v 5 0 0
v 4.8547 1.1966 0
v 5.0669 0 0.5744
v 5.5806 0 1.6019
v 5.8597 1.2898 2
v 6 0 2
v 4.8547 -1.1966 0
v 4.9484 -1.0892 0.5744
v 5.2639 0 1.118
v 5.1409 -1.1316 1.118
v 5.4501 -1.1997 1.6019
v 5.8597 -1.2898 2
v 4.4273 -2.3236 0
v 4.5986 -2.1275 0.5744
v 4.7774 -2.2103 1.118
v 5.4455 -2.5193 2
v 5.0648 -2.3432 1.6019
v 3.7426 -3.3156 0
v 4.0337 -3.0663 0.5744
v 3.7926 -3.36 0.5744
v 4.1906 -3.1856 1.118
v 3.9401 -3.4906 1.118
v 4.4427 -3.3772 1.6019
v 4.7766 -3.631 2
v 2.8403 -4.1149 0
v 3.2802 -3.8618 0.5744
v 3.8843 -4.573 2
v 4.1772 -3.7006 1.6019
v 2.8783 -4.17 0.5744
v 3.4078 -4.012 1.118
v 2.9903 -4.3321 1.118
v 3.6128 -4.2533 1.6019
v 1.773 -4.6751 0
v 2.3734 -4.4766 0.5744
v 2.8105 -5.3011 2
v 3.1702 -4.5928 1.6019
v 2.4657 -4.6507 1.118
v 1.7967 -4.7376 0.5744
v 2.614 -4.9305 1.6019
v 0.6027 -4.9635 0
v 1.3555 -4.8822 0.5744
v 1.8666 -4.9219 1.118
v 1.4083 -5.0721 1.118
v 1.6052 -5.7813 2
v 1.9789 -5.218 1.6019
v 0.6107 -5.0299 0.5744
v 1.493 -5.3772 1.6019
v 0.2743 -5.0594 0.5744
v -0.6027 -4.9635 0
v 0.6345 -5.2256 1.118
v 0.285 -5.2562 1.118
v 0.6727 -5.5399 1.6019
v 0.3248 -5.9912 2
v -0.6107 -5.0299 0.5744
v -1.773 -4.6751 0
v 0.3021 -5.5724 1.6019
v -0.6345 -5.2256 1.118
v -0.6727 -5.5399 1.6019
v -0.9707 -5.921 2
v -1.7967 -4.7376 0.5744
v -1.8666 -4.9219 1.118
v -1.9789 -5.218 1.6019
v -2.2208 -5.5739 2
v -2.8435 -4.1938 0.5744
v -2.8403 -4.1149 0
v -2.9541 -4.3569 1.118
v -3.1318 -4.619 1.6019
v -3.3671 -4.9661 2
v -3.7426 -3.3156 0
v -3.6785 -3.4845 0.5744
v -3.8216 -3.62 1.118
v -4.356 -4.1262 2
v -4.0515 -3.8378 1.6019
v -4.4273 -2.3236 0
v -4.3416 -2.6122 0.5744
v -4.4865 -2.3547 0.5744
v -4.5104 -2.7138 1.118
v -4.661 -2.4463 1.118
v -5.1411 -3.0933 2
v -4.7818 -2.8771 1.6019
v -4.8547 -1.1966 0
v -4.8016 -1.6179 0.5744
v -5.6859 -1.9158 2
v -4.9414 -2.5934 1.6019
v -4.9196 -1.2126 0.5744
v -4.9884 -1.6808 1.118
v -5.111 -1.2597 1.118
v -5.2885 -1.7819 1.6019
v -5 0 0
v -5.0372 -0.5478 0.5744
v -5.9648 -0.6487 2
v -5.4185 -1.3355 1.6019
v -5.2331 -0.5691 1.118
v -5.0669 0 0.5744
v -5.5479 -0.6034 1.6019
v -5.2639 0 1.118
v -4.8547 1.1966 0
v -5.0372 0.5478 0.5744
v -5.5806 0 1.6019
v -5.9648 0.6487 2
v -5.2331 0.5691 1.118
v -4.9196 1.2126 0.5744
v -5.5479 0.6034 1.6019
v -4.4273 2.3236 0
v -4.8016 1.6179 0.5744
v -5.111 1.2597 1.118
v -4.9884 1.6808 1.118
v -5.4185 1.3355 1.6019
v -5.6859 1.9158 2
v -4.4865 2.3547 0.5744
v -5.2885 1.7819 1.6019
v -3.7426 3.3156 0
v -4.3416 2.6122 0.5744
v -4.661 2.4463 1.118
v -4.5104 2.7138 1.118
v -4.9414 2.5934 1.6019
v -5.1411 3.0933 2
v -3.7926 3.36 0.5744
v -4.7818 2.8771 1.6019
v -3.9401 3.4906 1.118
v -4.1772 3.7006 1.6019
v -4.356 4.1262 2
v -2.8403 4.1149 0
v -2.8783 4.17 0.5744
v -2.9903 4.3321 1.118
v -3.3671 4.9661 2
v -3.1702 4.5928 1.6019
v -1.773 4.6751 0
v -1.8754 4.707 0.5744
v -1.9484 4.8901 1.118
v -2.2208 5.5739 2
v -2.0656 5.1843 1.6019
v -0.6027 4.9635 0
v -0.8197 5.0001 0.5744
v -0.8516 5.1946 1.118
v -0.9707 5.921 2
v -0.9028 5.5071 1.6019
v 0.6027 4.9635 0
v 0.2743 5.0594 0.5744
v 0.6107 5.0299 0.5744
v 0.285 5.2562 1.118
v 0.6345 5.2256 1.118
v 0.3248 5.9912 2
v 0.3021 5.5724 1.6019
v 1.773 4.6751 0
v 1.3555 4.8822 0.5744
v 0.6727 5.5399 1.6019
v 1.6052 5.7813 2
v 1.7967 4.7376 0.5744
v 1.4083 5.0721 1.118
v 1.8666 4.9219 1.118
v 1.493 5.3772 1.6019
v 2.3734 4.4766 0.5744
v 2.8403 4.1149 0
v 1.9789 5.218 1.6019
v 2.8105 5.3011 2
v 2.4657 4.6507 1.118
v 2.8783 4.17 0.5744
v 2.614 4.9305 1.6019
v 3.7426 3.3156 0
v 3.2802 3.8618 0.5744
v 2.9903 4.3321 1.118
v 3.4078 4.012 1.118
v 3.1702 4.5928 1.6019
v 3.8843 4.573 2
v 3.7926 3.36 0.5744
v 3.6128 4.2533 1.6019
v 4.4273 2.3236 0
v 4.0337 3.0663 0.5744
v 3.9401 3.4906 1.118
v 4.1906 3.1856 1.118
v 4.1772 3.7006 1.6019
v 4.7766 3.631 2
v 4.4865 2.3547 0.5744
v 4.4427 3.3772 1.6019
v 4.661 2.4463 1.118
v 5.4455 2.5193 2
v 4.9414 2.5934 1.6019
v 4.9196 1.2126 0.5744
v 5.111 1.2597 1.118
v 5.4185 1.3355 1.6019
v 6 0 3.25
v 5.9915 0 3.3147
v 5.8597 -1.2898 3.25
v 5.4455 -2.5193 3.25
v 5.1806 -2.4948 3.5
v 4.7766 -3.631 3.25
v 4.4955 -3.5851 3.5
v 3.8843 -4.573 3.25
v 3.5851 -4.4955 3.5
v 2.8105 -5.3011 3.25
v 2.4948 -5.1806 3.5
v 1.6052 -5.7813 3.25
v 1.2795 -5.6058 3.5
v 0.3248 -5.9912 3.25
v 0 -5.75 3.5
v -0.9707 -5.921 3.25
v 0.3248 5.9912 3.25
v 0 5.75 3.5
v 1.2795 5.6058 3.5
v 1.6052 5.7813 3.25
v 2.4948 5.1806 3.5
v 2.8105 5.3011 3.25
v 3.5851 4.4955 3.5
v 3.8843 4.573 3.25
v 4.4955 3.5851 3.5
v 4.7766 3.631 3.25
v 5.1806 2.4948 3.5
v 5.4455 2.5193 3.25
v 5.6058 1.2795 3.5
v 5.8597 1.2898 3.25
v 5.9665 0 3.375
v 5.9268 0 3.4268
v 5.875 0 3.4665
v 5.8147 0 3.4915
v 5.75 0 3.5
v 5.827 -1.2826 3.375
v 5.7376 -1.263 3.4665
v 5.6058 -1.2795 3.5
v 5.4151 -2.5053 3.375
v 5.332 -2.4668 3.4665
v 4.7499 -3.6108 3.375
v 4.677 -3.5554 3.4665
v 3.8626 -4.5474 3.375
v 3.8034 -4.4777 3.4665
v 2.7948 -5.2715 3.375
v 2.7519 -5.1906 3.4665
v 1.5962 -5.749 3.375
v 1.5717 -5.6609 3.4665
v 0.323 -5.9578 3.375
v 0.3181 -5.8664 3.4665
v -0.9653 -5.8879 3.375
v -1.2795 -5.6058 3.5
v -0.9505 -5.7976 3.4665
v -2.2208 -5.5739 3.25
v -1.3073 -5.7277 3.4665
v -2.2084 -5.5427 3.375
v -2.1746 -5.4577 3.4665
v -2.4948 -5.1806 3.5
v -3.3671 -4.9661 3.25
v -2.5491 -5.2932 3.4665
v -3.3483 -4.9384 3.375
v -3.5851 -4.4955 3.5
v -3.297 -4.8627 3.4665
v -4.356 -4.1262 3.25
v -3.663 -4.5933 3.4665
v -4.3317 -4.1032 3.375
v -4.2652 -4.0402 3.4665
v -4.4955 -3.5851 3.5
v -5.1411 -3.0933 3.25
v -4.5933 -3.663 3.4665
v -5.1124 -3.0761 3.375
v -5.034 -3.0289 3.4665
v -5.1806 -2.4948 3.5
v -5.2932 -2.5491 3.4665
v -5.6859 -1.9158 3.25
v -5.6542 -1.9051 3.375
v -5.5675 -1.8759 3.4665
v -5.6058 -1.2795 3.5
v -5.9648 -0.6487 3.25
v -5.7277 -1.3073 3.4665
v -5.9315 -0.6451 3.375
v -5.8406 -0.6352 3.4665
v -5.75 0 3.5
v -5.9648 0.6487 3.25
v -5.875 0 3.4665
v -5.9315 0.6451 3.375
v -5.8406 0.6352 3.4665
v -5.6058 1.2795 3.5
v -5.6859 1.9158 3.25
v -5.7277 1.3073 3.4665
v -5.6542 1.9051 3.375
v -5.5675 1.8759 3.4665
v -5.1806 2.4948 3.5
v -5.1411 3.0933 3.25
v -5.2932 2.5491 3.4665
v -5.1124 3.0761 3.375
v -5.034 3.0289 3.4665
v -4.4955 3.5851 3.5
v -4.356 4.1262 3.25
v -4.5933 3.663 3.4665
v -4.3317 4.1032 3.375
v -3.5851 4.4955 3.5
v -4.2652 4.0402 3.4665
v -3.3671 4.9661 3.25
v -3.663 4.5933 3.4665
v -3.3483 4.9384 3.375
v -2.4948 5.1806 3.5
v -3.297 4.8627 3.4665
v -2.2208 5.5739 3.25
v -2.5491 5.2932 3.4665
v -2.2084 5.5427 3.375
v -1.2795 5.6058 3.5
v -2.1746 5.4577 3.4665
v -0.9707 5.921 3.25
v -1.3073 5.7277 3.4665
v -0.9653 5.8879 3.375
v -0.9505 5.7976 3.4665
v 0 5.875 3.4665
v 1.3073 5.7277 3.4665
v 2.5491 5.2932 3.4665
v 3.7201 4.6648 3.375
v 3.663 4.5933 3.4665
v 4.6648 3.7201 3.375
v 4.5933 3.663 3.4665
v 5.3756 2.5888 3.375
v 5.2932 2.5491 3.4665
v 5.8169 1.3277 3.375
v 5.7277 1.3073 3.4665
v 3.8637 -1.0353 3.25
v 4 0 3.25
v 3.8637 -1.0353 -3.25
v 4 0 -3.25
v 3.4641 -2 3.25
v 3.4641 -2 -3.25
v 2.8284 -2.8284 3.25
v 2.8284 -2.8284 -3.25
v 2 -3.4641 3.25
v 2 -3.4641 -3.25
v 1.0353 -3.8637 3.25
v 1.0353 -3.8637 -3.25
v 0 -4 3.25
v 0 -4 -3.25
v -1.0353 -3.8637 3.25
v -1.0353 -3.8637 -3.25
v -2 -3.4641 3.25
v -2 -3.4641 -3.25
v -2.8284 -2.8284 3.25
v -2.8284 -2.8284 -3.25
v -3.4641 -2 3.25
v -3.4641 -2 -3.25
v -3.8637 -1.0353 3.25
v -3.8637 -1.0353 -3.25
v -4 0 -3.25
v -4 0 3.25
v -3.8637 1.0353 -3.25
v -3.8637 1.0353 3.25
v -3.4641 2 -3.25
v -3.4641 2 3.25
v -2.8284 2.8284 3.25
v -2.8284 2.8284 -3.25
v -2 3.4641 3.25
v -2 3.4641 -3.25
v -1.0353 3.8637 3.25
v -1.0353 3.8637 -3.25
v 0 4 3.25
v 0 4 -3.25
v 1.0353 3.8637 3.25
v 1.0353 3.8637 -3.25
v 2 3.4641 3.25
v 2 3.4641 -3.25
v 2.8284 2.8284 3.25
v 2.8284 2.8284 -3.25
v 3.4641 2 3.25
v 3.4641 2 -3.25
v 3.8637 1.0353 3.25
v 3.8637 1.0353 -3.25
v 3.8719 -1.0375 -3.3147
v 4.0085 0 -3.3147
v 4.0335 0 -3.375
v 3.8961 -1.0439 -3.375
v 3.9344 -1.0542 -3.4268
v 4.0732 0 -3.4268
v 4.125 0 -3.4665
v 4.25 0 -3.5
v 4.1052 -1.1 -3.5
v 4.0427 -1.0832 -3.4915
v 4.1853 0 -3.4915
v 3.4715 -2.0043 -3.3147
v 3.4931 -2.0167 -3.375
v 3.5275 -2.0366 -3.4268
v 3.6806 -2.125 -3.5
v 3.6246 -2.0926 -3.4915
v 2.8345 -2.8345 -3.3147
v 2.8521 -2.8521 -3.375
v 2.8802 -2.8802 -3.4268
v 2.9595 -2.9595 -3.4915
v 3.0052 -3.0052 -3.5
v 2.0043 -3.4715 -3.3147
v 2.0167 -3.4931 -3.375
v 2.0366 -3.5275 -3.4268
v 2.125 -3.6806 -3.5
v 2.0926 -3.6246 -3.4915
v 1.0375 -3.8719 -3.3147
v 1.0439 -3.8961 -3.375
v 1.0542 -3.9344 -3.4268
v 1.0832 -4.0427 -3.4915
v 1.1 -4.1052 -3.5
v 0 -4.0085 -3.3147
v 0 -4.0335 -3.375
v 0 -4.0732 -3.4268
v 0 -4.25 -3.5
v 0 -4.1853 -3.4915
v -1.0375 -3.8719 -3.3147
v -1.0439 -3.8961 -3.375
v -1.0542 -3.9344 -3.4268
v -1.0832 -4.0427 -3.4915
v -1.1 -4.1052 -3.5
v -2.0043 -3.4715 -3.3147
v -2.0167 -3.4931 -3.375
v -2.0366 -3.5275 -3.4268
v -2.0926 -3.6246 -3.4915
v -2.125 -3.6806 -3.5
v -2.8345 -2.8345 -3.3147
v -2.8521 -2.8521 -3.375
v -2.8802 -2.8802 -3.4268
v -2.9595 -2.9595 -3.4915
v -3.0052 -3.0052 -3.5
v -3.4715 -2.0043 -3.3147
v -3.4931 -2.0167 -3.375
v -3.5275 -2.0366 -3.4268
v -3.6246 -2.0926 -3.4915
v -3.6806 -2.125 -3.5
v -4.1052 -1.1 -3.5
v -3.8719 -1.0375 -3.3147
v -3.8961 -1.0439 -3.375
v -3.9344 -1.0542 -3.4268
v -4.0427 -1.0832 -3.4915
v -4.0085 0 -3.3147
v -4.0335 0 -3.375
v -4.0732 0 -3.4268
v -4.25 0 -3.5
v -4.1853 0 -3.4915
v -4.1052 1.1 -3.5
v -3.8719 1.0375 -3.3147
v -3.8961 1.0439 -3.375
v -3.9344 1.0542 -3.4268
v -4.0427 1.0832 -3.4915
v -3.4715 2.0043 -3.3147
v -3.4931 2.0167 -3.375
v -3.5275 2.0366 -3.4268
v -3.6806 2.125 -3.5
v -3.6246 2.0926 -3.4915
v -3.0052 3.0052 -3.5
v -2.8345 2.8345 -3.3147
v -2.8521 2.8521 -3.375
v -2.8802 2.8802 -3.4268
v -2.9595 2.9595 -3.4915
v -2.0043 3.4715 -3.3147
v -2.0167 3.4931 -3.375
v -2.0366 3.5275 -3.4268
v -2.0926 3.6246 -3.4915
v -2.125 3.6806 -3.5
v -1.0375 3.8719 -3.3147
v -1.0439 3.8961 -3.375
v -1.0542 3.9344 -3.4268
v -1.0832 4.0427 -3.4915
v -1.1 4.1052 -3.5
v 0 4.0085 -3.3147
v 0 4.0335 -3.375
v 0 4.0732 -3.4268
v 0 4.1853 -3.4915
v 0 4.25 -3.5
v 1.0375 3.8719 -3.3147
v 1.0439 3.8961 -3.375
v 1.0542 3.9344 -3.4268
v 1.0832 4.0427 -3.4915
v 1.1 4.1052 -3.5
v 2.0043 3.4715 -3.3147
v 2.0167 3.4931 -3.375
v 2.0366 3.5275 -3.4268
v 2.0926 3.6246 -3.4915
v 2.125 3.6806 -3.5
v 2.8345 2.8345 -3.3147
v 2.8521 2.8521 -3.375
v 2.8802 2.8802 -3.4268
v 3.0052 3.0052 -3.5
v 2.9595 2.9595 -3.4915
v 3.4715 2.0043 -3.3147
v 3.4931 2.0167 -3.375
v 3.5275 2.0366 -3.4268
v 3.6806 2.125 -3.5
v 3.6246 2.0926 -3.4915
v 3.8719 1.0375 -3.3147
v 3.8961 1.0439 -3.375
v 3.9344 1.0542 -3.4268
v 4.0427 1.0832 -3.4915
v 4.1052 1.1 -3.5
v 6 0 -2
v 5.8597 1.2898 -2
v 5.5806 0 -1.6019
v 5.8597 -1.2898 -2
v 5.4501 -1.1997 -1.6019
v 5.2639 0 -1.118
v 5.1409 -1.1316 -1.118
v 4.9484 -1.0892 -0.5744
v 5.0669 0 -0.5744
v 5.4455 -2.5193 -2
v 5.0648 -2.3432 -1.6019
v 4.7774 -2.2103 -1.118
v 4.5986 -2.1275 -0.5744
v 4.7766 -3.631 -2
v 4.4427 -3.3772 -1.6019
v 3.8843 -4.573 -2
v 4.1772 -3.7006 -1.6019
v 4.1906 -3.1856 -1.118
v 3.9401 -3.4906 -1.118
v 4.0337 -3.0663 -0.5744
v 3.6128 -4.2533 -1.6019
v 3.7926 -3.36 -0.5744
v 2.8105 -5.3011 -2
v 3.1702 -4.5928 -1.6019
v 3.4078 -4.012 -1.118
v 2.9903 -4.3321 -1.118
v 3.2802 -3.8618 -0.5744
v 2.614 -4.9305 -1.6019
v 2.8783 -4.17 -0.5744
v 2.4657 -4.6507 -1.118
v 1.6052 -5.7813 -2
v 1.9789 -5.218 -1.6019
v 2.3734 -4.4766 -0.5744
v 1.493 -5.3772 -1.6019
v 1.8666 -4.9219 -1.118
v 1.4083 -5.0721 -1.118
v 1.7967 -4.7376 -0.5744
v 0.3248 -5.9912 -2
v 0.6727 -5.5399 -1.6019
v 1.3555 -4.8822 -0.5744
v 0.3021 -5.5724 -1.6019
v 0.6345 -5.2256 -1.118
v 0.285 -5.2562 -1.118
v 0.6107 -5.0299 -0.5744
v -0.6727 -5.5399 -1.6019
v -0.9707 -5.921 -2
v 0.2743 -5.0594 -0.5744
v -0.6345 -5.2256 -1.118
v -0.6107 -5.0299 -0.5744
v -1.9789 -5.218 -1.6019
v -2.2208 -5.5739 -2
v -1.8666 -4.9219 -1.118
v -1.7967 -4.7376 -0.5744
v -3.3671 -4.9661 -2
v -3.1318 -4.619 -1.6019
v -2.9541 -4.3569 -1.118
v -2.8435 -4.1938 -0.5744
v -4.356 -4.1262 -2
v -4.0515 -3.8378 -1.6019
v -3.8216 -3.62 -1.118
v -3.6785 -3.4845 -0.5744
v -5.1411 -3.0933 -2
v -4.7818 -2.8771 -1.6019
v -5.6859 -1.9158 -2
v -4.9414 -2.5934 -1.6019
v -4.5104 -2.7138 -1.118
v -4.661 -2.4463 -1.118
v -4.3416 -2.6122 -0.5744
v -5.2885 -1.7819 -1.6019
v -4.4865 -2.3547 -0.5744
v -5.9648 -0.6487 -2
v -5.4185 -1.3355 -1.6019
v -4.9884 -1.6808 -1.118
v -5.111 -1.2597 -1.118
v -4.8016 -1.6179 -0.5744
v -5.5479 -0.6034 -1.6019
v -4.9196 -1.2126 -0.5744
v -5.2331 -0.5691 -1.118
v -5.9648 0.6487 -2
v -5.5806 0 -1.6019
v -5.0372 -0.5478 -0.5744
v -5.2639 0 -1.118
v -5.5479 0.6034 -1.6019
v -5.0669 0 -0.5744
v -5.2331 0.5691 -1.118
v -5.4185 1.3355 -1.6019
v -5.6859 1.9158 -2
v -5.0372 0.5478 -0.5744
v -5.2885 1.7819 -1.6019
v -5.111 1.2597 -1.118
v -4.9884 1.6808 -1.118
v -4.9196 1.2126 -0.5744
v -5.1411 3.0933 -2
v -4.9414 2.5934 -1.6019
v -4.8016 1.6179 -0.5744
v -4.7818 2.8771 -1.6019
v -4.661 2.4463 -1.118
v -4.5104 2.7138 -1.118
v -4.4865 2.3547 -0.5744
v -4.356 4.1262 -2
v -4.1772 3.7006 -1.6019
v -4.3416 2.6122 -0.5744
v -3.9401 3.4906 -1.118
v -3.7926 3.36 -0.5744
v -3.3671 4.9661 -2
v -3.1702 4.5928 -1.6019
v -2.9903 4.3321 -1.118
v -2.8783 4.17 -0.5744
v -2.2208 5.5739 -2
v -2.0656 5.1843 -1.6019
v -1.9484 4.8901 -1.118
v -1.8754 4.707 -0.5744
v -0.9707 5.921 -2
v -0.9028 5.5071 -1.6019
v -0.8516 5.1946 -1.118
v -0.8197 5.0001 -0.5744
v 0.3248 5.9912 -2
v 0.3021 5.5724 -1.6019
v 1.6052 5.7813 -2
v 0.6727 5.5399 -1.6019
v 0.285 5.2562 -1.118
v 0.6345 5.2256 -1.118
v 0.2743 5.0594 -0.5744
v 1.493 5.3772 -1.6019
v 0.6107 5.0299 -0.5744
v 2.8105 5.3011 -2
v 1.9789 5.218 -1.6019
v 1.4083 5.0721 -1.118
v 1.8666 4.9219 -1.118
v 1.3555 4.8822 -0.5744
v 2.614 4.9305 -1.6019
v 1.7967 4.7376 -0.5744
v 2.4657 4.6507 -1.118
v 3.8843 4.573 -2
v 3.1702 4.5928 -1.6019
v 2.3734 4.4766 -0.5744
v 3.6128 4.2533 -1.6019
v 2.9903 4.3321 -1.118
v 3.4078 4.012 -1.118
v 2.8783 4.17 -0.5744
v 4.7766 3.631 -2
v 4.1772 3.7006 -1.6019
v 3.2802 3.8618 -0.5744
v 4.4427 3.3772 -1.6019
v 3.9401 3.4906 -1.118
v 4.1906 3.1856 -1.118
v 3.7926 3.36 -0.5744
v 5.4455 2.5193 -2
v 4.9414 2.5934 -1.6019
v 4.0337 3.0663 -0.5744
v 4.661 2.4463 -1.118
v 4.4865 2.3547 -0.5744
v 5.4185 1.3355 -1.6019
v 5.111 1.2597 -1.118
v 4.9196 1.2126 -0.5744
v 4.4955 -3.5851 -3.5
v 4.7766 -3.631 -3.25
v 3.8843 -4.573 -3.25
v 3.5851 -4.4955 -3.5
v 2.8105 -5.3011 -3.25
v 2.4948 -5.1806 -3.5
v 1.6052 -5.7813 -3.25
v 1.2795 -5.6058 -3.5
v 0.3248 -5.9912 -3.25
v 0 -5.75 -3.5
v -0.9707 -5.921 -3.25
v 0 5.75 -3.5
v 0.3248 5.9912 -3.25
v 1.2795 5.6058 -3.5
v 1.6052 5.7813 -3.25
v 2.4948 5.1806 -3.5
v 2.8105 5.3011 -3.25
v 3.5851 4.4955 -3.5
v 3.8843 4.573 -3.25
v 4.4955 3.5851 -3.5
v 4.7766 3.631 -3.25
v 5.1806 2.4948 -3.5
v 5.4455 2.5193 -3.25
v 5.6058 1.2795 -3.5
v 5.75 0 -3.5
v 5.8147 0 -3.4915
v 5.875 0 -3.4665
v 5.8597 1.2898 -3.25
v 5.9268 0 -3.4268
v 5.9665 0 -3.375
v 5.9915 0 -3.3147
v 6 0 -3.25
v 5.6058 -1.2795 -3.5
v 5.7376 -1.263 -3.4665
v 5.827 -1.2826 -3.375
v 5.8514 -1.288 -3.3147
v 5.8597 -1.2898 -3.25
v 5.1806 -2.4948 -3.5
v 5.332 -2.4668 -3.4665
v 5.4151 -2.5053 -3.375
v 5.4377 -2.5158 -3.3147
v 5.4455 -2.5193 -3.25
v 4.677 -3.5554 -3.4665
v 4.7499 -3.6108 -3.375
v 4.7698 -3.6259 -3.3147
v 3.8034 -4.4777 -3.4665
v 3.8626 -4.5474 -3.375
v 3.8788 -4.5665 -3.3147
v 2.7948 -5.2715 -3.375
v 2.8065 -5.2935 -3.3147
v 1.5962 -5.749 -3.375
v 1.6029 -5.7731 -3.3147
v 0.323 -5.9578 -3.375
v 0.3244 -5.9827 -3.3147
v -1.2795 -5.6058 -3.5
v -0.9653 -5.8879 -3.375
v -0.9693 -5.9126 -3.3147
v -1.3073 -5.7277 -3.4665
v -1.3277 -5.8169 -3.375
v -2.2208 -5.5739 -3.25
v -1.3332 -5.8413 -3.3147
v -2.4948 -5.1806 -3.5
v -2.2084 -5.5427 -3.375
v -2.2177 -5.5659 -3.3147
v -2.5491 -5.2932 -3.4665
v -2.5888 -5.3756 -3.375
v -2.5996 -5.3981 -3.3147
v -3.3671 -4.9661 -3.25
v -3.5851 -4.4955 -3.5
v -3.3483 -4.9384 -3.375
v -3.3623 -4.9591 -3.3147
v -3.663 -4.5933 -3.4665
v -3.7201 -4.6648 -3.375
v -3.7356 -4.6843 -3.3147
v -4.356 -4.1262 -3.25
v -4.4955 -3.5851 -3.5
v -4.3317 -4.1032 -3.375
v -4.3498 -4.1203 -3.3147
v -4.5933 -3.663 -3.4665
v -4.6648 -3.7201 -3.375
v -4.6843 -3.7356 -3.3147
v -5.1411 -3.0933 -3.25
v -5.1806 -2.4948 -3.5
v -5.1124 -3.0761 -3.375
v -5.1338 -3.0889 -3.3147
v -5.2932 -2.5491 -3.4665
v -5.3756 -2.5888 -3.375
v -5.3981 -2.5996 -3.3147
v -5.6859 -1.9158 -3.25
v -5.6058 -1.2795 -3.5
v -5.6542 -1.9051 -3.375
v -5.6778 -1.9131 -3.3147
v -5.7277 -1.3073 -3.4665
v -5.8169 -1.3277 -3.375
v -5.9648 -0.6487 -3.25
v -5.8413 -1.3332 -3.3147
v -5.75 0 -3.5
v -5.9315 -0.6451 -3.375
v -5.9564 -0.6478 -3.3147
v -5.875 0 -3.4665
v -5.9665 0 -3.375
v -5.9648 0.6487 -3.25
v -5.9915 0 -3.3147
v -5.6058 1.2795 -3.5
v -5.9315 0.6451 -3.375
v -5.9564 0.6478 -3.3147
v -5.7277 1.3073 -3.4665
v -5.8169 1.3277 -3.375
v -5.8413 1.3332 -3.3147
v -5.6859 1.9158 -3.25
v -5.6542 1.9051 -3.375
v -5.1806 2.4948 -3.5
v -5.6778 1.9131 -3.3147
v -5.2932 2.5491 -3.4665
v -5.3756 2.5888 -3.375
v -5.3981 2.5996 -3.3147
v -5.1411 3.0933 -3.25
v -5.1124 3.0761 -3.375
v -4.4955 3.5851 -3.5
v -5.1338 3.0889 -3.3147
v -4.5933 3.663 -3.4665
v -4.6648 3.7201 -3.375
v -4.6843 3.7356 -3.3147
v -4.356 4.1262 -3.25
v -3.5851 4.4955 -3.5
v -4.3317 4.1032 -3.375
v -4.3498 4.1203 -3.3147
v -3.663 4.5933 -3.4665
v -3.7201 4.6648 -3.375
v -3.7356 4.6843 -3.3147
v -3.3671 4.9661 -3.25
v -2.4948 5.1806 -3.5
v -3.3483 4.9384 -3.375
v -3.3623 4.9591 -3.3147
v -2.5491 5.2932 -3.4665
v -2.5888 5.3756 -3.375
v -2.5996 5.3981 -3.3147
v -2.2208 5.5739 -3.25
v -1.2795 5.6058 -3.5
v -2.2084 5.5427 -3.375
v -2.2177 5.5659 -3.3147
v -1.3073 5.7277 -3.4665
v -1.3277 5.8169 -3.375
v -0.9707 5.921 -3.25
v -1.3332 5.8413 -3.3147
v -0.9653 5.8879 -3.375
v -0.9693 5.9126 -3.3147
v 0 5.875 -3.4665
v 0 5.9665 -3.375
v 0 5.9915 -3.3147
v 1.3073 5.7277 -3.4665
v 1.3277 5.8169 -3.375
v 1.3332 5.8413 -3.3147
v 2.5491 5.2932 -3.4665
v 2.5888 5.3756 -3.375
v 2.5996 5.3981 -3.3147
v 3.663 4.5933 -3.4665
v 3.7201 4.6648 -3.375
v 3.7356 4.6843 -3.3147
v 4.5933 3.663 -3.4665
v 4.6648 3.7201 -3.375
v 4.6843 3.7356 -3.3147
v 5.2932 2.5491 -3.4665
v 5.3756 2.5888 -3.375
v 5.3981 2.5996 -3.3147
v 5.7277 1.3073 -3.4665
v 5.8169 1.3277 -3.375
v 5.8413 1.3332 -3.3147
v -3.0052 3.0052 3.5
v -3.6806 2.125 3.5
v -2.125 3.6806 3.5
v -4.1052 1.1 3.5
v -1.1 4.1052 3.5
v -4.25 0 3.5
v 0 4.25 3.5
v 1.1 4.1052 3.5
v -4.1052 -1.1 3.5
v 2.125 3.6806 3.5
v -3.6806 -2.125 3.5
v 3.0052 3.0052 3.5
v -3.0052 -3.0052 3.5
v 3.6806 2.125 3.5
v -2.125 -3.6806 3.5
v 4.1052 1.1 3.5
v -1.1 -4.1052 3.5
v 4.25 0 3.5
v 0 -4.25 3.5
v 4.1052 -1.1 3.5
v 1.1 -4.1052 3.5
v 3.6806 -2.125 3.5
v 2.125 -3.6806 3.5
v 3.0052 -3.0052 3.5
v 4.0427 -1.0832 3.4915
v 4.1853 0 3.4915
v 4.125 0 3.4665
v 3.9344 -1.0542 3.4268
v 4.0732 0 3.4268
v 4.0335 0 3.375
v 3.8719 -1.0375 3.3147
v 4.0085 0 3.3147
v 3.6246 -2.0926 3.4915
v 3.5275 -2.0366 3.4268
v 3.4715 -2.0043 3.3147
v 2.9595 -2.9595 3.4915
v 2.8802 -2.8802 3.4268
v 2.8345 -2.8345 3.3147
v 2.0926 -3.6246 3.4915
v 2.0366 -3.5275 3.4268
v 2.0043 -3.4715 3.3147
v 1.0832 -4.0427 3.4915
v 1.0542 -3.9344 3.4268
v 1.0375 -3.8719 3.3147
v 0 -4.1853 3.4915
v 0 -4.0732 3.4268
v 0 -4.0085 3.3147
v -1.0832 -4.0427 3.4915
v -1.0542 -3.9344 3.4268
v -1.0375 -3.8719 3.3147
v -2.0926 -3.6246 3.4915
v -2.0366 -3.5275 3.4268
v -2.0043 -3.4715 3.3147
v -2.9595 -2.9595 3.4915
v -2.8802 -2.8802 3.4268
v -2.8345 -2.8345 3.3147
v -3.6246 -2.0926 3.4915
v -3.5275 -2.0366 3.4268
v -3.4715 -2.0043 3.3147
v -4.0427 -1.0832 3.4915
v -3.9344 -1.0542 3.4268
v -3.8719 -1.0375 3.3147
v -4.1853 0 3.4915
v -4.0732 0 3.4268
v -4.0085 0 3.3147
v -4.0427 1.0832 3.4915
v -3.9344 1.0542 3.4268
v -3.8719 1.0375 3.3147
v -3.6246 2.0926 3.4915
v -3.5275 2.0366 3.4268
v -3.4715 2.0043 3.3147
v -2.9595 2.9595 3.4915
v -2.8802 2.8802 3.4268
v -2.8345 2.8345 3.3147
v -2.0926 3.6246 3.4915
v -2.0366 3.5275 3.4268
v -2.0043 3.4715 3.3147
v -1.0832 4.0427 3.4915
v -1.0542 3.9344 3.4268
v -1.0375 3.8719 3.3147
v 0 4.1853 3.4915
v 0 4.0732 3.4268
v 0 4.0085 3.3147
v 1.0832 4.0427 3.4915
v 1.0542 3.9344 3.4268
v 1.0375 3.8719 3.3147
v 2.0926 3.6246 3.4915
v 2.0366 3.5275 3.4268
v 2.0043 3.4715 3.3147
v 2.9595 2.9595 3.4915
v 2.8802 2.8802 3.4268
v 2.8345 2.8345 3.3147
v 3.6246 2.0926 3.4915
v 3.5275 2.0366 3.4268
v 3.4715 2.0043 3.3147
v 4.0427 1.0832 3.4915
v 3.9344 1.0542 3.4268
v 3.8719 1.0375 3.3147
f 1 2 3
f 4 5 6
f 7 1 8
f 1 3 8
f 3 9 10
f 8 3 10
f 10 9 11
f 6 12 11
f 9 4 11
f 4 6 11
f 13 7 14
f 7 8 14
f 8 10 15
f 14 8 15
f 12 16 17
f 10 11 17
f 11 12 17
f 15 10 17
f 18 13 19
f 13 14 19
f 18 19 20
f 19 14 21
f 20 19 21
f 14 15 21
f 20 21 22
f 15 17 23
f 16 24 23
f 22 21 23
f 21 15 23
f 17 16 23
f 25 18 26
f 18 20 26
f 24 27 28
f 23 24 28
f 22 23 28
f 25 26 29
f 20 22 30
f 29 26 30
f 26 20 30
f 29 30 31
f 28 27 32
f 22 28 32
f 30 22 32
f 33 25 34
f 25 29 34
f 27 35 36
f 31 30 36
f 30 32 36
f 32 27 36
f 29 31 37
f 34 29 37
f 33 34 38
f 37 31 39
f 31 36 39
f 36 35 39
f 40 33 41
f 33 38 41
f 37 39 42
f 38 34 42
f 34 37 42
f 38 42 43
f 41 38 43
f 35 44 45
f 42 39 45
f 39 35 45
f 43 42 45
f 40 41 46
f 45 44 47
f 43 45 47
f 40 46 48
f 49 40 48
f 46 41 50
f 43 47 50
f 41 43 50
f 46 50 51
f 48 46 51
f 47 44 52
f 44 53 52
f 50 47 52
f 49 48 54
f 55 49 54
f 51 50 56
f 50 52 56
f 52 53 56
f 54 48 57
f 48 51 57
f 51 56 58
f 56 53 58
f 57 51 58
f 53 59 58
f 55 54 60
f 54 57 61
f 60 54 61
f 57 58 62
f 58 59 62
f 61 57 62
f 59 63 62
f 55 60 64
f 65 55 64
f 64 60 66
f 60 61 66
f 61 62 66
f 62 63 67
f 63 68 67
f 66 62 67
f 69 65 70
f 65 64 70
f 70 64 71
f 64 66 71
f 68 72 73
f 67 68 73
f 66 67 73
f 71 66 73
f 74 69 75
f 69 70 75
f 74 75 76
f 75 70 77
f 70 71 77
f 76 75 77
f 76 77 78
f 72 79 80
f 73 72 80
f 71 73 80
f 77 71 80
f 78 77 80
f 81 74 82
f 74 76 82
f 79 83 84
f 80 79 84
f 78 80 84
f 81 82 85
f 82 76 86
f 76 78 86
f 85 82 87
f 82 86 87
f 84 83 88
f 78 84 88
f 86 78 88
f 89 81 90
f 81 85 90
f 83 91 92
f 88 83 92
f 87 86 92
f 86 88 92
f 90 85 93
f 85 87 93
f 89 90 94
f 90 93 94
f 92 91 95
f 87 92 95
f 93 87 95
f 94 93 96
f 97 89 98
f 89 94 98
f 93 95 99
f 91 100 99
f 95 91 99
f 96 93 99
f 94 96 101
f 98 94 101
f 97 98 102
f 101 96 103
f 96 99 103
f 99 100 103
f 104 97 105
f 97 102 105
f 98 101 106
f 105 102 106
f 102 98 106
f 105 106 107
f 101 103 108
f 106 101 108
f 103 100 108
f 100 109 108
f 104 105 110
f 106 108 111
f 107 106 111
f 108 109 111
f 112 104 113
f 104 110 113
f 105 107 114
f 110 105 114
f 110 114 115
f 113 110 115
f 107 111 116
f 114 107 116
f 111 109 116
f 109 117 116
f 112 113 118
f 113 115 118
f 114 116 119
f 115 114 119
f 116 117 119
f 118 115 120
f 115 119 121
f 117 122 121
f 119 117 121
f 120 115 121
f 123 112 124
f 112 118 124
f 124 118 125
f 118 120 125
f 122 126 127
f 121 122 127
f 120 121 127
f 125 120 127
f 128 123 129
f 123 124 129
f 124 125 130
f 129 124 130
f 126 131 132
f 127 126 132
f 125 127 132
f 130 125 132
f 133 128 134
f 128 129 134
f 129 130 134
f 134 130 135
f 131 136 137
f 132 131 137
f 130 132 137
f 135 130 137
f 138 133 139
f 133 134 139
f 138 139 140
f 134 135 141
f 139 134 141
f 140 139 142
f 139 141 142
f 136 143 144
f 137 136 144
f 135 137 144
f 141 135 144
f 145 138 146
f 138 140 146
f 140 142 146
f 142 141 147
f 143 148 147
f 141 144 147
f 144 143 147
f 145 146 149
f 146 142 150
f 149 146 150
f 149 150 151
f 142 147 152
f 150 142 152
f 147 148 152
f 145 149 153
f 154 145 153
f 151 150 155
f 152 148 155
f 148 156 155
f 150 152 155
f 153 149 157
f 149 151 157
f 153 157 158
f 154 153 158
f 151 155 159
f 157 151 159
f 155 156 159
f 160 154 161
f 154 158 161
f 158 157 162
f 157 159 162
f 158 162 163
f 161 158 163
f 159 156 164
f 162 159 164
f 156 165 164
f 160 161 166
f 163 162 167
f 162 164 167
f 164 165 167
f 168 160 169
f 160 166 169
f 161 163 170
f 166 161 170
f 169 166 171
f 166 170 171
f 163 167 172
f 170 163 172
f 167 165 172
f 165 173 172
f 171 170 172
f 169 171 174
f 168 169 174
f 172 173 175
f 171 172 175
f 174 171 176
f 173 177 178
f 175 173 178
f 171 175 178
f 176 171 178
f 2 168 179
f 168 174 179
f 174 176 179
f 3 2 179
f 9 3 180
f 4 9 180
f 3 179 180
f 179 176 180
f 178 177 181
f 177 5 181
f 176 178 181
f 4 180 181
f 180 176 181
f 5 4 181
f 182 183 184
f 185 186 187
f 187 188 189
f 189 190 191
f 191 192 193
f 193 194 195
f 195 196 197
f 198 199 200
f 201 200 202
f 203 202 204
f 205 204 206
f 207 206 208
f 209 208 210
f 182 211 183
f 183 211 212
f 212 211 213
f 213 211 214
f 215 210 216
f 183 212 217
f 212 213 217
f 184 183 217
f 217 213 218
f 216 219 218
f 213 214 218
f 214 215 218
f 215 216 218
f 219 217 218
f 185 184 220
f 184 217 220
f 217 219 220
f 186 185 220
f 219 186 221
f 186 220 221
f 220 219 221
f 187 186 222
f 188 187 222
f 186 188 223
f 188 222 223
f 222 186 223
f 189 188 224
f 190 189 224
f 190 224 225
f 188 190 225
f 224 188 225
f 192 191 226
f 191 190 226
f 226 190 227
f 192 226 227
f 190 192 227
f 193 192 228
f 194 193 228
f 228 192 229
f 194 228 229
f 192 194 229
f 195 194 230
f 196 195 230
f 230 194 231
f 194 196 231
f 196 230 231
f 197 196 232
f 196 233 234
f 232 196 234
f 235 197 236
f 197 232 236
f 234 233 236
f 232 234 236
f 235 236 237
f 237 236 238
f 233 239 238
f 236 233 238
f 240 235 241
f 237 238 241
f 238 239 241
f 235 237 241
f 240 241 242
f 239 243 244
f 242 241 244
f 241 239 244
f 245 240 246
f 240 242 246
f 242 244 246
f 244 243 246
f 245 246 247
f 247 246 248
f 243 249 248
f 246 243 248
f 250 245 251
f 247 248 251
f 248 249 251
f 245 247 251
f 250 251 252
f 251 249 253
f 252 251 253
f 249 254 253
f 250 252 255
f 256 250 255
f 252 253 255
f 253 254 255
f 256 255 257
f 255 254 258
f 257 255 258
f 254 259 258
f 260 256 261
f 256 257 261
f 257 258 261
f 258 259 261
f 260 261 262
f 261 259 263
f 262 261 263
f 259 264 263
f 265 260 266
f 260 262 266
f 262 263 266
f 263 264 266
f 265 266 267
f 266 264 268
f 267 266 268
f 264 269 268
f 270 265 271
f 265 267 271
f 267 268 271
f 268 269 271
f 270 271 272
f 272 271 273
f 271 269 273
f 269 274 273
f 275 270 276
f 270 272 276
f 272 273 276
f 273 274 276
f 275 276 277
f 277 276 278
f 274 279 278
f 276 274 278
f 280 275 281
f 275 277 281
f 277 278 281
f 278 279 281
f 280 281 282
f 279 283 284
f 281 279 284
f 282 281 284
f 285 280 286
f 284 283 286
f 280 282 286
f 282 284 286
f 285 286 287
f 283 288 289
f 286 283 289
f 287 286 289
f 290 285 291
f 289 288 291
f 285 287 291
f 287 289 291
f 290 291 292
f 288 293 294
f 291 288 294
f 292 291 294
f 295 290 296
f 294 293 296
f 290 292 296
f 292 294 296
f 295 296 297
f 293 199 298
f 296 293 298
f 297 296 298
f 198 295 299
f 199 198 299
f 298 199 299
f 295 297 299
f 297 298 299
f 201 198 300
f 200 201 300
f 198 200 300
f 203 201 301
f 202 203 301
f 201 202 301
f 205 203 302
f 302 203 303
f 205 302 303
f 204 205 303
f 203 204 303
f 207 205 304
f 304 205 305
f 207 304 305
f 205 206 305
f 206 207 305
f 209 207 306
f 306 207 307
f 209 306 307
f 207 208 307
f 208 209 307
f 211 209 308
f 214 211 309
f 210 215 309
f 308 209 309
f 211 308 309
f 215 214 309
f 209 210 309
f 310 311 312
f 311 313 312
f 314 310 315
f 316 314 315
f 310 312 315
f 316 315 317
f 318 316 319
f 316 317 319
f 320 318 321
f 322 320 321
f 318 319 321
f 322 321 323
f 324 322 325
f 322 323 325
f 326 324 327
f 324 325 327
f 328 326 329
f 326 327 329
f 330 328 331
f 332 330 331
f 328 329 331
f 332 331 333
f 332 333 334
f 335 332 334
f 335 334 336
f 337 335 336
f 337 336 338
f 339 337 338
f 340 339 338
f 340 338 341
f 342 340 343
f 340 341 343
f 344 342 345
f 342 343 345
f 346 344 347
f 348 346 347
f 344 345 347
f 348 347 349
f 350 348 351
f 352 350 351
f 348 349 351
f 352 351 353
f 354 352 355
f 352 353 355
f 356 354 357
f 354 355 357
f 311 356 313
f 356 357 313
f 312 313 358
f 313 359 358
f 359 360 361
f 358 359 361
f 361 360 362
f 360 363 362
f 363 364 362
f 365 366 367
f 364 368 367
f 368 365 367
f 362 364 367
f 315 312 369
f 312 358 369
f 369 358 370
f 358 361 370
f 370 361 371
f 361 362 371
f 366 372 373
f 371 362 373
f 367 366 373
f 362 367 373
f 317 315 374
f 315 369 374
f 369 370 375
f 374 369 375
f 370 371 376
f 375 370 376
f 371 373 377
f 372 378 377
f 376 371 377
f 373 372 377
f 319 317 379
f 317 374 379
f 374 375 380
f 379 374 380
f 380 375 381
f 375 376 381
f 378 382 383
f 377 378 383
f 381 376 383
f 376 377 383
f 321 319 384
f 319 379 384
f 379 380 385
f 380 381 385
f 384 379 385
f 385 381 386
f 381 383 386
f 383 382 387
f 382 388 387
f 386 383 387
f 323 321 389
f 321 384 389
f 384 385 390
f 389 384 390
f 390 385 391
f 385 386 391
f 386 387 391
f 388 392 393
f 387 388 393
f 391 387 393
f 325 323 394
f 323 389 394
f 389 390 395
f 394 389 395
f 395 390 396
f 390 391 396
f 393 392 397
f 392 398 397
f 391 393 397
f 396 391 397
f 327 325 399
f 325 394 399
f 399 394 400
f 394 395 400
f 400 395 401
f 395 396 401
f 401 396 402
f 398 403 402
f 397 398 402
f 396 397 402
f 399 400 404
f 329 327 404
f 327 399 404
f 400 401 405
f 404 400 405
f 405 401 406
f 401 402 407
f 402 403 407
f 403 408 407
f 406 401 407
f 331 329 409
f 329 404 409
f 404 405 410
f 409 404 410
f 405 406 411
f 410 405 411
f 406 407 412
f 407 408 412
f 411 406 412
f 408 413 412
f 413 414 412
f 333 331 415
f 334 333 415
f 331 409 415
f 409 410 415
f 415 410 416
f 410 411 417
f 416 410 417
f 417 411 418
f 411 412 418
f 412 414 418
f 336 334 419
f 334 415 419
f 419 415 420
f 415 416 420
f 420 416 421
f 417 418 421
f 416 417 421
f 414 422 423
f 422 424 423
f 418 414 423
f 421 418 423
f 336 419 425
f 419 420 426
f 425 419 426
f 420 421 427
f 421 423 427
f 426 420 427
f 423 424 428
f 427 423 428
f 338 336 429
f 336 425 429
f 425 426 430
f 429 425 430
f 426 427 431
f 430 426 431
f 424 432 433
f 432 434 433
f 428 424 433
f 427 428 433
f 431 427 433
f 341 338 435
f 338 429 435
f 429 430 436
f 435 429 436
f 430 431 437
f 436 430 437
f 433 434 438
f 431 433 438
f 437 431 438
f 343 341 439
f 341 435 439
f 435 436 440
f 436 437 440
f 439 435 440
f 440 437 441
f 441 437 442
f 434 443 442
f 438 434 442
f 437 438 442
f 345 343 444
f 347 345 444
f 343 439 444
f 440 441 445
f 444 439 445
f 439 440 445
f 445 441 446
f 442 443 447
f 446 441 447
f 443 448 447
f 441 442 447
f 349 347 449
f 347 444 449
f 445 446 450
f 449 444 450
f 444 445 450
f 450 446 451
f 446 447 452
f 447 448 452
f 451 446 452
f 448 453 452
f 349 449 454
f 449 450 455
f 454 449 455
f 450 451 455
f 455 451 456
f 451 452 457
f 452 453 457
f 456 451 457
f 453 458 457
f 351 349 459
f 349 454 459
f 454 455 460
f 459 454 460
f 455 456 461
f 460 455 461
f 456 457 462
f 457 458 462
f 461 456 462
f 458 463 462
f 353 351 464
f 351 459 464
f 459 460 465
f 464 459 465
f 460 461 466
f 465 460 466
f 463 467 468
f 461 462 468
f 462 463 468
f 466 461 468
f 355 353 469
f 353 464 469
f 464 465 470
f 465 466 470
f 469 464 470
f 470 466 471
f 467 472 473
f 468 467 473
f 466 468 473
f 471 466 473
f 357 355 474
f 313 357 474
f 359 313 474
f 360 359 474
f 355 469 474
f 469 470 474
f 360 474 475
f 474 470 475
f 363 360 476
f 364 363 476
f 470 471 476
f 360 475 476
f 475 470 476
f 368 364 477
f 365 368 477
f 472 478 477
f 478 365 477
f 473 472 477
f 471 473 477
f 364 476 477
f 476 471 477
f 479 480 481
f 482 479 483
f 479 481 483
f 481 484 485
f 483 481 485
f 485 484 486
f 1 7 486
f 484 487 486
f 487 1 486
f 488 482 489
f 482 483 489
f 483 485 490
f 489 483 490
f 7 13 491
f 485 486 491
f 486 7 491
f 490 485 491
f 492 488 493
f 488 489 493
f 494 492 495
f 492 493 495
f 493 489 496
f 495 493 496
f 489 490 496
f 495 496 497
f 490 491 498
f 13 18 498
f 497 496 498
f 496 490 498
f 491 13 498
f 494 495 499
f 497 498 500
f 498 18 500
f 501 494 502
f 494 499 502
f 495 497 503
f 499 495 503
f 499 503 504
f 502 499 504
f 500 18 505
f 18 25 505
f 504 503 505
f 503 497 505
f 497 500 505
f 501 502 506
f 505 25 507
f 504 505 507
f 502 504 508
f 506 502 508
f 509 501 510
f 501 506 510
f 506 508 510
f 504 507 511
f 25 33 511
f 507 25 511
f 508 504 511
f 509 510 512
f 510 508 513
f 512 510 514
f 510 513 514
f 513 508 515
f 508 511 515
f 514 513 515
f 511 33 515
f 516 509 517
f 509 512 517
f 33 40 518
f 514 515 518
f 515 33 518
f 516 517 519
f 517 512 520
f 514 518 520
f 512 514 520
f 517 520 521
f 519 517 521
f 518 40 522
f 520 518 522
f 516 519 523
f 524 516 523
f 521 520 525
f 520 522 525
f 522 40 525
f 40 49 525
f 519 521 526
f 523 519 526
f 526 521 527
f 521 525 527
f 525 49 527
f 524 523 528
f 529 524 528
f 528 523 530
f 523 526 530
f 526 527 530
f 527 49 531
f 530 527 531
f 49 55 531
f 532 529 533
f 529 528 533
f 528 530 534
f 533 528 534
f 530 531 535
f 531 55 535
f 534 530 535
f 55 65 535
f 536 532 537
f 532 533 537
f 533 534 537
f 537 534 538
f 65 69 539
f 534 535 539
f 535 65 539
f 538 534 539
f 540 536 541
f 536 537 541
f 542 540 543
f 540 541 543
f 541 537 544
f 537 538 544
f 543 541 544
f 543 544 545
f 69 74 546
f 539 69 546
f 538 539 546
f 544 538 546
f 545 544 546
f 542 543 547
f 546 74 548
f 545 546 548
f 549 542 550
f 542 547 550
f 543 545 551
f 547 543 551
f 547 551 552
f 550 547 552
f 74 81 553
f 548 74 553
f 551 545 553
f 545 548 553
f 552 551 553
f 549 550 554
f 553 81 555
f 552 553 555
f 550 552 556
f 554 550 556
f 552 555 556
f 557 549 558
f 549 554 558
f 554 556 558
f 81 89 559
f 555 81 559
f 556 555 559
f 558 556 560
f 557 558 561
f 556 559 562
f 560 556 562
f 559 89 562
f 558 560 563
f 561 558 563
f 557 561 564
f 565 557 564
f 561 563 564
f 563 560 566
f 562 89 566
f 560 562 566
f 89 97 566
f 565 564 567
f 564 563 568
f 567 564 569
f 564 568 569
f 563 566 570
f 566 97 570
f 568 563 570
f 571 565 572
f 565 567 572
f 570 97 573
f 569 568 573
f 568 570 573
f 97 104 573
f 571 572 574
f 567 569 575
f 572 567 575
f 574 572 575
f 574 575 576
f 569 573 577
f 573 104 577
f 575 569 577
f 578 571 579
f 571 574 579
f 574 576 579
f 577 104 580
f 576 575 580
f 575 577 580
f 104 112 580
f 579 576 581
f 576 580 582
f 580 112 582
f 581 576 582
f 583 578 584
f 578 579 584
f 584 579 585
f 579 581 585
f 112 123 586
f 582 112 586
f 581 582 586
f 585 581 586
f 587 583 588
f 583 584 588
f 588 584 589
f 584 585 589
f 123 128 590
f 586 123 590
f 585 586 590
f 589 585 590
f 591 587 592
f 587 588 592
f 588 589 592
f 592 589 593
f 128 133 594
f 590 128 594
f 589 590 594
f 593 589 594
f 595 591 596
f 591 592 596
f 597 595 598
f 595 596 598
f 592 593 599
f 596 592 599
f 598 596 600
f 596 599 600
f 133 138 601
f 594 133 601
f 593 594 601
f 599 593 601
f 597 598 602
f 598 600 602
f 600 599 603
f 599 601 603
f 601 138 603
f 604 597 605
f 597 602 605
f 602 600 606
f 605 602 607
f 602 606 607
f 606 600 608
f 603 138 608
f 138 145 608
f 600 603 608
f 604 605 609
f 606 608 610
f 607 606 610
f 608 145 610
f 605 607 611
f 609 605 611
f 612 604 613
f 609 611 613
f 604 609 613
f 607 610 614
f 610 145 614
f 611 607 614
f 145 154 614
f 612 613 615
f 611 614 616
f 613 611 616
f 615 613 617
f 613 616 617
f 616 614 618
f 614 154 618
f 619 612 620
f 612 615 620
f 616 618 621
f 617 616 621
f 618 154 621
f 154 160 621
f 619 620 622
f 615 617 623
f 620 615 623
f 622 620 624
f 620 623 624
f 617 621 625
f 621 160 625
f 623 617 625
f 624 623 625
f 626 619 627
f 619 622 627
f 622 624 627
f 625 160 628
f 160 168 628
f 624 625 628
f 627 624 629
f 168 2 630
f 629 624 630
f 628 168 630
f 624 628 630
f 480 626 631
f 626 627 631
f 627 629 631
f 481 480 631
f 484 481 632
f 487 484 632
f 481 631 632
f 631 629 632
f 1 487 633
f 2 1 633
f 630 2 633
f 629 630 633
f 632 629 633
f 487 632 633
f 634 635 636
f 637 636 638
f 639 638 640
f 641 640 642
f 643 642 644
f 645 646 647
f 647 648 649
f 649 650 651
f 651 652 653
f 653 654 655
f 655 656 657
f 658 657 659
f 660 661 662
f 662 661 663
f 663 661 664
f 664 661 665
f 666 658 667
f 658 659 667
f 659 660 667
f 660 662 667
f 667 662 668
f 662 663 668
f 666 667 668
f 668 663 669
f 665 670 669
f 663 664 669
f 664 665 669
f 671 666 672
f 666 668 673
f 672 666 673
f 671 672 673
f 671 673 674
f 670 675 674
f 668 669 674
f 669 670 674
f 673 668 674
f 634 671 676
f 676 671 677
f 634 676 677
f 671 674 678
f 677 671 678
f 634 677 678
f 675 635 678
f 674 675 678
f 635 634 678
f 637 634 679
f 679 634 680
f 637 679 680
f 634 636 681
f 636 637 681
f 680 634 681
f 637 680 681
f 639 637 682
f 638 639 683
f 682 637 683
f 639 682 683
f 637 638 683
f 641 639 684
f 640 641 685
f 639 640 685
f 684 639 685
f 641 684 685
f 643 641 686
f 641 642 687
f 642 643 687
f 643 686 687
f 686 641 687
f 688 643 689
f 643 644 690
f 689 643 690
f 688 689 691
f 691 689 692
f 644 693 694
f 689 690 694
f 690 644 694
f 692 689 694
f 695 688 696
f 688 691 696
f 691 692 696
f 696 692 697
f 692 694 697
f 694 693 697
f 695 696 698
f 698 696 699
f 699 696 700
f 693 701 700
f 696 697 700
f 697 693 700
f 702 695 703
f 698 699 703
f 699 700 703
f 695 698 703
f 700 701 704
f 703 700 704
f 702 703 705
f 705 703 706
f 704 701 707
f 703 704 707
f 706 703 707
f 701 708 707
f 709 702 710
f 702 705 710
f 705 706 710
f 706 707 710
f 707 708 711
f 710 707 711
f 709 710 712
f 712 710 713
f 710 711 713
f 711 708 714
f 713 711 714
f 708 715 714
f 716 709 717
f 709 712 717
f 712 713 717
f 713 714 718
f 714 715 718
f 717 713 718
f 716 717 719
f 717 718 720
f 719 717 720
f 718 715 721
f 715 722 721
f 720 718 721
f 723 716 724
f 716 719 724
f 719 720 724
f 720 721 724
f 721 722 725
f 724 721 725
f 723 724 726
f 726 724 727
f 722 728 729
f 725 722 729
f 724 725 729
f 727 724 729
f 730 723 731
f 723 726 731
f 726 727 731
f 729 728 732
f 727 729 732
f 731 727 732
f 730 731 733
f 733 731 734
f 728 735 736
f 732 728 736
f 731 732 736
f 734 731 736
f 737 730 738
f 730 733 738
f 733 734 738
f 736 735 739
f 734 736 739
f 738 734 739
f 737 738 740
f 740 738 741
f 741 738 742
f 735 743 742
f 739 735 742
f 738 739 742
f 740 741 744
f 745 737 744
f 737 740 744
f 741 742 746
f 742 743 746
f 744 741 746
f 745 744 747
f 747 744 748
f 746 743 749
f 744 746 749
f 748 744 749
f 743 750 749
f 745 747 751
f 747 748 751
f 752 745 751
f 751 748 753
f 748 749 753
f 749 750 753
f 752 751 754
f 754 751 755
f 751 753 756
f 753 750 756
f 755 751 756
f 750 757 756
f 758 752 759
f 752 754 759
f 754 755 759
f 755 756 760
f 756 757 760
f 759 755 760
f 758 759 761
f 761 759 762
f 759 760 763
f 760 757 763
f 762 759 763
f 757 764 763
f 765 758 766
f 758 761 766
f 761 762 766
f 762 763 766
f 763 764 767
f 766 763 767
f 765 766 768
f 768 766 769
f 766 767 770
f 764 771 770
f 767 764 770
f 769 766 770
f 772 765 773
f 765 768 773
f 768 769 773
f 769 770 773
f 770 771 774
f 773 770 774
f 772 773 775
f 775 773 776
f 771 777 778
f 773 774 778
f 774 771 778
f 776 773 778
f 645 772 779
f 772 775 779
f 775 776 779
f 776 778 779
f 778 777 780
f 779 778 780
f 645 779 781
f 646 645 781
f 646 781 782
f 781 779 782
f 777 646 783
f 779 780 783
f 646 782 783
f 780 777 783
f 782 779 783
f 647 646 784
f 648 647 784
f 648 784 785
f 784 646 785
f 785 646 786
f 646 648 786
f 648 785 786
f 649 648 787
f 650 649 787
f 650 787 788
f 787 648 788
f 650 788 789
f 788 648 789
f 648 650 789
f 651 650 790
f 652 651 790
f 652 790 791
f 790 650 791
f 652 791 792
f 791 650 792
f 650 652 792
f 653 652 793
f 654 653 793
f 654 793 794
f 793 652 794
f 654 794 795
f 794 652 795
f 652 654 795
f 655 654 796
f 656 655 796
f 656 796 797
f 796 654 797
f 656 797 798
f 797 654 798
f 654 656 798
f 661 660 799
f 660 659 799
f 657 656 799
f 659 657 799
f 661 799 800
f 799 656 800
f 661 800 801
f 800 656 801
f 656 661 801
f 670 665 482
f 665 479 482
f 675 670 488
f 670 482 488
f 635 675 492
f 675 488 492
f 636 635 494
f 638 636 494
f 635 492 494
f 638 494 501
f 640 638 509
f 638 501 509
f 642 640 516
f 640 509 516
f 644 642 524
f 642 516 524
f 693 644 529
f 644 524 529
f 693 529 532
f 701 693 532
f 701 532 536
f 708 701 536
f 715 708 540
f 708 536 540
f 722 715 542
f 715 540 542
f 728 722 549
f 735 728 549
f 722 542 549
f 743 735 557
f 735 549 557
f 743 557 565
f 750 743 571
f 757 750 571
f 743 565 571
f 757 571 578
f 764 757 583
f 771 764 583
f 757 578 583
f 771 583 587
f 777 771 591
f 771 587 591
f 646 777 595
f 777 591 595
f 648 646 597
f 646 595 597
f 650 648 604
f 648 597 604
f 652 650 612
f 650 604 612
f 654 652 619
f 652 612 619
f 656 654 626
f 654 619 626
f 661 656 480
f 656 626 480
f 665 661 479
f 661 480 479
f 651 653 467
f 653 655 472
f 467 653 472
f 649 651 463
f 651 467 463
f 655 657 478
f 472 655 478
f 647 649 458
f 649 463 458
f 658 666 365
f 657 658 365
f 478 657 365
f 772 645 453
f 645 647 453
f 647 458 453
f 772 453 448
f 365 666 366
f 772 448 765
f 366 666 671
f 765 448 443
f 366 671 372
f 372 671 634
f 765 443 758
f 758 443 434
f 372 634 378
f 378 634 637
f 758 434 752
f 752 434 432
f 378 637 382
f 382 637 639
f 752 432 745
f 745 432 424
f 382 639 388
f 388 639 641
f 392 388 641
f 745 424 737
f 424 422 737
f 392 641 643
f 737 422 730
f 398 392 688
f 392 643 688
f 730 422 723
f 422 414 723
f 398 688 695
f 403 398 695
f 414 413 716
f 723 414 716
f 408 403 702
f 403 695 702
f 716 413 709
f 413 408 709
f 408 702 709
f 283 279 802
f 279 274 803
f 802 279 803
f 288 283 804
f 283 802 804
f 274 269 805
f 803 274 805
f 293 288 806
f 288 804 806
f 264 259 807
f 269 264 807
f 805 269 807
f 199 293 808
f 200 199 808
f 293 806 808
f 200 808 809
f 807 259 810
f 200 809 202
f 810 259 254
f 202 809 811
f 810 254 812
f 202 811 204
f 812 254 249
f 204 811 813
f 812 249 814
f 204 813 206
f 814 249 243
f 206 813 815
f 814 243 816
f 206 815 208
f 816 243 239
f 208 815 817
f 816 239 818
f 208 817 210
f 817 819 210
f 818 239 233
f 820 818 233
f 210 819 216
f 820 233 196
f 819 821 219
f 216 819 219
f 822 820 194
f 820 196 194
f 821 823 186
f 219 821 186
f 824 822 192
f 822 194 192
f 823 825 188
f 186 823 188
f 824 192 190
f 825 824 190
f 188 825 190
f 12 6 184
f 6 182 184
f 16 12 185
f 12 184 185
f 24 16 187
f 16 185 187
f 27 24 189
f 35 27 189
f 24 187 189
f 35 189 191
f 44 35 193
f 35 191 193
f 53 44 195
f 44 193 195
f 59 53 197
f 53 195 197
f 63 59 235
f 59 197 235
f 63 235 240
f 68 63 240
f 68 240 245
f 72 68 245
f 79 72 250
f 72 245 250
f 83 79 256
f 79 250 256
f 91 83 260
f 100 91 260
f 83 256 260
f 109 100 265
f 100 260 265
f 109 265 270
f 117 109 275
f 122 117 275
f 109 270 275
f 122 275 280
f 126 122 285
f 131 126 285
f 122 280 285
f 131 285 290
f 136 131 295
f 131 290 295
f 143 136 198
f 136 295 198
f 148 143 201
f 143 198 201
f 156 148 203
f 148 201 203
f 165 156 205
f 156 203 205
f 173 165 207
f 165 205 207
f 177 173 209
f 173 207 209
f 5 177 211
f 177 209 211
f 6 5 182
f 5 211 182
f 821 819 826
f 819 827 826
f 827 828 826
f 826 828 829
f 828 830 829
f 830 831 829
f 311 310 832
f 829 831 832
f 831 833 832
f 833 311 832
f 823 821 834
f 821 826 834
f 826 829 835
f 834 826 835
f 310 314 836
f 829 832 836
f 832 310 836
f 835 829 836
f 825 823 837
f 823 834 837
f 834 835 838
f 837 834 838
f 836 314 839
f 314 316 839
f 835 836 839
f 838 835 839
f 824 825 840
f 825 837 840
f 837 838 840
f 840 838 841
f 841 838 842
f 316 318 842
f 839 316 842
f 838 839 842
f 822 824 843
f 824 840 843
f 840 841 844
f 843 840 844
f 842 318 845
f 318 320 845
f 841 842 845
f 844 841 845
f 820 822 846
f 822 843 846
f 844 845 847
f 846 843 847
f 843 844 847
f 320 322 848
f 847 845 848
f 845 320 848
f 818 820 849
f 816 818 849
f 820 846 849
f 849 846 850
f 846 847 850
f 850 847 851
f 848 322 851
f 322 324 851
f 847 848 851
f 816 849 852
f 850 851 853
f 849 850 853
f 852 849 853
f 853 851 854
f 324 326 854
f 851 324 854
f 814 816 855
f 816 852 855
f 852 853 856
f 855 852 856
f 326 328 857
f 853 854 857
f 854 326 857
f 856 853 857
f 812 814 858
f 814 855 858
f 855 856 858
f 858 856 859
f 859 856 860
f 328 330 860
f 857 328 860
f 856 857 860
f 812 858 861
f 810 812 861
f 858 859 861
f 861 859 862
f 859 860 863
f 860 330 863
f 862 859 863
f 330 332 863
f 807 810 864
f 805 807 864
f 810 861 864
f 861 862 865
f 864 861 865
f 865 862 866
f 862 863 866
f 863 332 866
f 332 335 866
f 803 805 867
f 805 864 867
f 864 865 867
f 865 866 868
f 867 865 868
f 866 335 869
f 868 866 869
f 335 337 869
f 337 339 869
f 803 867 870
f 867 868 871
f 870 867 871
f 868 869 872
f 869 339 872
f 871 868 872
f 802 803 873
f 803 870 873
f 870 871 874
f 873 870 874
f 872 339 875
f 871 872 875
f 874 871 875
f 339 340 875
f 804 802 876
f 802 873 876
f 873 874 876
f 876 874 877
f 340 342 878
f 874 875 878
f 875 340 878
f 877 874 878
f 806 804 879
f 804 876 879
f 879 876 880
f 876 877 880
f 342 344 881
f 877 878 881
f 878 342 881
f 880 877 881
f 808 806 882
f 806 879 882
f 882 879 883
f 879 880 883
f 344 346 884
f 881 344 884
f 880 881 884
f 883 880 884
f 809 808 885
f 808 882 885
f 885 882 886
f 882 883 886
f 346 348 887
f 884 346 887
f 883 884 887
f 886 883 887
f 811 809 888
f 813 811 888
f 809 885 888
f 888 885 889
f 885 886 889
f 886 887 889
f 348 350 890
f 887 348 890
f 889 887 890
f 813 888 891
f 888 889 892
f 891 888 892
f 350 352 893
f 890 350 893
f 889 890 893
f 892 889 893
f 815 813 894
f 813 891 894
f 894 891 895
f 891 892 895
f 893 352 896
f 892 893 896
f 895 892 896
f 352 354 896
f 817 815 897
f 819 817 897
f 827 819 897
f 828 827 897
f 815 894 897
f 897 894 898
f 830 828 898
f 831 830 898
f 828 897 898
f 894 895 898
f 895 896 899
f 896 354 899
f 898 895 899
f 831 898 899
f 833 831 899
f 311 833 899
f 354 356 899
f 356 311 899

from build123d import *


with BuildPart() as f1:
    # F0 (on Front) → F1 (revolve)
    with BuildSketch(Plane.XZ):
        with BuildLine():
            Line((4, 3.25), (4, 0))
            Line((4, 0), (5, 0))
            ThreePointArc((5, 0), (5.263932, 1.118034), (6, 2))
            Line((6, 2), (6, 3.25))
            ThreePointArc((6, 3.25), (5.926777, 3.426777), (5.75, 3.5))
            Line((5.75, 3.5), (4.25, 3.5))
            ThreePointArc((4.25, 3.5), (4.073223, 3.426777), (4, 3.25))
        make_face()
        with BuildLine():
            Line((5, 0), (4, 0))
            Line((4, 0), (4, -3.25))
            ThreePointArc((4, -3.25), (4.073223, -3.426777), (4.25, -3.5))
            Line((4.25, -3.5), (5.75, -3.5))
            ThreePointArc((5.75, -3.5), (5.926777, -3.426777), (6, -3.25))
            Line((6, -3.25), (6, -2))
            ThreePointArc((6, -2), (5.263932, -1.118034), (5, 0))
        make_face()
    revolve(axis=Axis((0, 0, 0.334755), (0, 0, -1)))


solid = f1.part
